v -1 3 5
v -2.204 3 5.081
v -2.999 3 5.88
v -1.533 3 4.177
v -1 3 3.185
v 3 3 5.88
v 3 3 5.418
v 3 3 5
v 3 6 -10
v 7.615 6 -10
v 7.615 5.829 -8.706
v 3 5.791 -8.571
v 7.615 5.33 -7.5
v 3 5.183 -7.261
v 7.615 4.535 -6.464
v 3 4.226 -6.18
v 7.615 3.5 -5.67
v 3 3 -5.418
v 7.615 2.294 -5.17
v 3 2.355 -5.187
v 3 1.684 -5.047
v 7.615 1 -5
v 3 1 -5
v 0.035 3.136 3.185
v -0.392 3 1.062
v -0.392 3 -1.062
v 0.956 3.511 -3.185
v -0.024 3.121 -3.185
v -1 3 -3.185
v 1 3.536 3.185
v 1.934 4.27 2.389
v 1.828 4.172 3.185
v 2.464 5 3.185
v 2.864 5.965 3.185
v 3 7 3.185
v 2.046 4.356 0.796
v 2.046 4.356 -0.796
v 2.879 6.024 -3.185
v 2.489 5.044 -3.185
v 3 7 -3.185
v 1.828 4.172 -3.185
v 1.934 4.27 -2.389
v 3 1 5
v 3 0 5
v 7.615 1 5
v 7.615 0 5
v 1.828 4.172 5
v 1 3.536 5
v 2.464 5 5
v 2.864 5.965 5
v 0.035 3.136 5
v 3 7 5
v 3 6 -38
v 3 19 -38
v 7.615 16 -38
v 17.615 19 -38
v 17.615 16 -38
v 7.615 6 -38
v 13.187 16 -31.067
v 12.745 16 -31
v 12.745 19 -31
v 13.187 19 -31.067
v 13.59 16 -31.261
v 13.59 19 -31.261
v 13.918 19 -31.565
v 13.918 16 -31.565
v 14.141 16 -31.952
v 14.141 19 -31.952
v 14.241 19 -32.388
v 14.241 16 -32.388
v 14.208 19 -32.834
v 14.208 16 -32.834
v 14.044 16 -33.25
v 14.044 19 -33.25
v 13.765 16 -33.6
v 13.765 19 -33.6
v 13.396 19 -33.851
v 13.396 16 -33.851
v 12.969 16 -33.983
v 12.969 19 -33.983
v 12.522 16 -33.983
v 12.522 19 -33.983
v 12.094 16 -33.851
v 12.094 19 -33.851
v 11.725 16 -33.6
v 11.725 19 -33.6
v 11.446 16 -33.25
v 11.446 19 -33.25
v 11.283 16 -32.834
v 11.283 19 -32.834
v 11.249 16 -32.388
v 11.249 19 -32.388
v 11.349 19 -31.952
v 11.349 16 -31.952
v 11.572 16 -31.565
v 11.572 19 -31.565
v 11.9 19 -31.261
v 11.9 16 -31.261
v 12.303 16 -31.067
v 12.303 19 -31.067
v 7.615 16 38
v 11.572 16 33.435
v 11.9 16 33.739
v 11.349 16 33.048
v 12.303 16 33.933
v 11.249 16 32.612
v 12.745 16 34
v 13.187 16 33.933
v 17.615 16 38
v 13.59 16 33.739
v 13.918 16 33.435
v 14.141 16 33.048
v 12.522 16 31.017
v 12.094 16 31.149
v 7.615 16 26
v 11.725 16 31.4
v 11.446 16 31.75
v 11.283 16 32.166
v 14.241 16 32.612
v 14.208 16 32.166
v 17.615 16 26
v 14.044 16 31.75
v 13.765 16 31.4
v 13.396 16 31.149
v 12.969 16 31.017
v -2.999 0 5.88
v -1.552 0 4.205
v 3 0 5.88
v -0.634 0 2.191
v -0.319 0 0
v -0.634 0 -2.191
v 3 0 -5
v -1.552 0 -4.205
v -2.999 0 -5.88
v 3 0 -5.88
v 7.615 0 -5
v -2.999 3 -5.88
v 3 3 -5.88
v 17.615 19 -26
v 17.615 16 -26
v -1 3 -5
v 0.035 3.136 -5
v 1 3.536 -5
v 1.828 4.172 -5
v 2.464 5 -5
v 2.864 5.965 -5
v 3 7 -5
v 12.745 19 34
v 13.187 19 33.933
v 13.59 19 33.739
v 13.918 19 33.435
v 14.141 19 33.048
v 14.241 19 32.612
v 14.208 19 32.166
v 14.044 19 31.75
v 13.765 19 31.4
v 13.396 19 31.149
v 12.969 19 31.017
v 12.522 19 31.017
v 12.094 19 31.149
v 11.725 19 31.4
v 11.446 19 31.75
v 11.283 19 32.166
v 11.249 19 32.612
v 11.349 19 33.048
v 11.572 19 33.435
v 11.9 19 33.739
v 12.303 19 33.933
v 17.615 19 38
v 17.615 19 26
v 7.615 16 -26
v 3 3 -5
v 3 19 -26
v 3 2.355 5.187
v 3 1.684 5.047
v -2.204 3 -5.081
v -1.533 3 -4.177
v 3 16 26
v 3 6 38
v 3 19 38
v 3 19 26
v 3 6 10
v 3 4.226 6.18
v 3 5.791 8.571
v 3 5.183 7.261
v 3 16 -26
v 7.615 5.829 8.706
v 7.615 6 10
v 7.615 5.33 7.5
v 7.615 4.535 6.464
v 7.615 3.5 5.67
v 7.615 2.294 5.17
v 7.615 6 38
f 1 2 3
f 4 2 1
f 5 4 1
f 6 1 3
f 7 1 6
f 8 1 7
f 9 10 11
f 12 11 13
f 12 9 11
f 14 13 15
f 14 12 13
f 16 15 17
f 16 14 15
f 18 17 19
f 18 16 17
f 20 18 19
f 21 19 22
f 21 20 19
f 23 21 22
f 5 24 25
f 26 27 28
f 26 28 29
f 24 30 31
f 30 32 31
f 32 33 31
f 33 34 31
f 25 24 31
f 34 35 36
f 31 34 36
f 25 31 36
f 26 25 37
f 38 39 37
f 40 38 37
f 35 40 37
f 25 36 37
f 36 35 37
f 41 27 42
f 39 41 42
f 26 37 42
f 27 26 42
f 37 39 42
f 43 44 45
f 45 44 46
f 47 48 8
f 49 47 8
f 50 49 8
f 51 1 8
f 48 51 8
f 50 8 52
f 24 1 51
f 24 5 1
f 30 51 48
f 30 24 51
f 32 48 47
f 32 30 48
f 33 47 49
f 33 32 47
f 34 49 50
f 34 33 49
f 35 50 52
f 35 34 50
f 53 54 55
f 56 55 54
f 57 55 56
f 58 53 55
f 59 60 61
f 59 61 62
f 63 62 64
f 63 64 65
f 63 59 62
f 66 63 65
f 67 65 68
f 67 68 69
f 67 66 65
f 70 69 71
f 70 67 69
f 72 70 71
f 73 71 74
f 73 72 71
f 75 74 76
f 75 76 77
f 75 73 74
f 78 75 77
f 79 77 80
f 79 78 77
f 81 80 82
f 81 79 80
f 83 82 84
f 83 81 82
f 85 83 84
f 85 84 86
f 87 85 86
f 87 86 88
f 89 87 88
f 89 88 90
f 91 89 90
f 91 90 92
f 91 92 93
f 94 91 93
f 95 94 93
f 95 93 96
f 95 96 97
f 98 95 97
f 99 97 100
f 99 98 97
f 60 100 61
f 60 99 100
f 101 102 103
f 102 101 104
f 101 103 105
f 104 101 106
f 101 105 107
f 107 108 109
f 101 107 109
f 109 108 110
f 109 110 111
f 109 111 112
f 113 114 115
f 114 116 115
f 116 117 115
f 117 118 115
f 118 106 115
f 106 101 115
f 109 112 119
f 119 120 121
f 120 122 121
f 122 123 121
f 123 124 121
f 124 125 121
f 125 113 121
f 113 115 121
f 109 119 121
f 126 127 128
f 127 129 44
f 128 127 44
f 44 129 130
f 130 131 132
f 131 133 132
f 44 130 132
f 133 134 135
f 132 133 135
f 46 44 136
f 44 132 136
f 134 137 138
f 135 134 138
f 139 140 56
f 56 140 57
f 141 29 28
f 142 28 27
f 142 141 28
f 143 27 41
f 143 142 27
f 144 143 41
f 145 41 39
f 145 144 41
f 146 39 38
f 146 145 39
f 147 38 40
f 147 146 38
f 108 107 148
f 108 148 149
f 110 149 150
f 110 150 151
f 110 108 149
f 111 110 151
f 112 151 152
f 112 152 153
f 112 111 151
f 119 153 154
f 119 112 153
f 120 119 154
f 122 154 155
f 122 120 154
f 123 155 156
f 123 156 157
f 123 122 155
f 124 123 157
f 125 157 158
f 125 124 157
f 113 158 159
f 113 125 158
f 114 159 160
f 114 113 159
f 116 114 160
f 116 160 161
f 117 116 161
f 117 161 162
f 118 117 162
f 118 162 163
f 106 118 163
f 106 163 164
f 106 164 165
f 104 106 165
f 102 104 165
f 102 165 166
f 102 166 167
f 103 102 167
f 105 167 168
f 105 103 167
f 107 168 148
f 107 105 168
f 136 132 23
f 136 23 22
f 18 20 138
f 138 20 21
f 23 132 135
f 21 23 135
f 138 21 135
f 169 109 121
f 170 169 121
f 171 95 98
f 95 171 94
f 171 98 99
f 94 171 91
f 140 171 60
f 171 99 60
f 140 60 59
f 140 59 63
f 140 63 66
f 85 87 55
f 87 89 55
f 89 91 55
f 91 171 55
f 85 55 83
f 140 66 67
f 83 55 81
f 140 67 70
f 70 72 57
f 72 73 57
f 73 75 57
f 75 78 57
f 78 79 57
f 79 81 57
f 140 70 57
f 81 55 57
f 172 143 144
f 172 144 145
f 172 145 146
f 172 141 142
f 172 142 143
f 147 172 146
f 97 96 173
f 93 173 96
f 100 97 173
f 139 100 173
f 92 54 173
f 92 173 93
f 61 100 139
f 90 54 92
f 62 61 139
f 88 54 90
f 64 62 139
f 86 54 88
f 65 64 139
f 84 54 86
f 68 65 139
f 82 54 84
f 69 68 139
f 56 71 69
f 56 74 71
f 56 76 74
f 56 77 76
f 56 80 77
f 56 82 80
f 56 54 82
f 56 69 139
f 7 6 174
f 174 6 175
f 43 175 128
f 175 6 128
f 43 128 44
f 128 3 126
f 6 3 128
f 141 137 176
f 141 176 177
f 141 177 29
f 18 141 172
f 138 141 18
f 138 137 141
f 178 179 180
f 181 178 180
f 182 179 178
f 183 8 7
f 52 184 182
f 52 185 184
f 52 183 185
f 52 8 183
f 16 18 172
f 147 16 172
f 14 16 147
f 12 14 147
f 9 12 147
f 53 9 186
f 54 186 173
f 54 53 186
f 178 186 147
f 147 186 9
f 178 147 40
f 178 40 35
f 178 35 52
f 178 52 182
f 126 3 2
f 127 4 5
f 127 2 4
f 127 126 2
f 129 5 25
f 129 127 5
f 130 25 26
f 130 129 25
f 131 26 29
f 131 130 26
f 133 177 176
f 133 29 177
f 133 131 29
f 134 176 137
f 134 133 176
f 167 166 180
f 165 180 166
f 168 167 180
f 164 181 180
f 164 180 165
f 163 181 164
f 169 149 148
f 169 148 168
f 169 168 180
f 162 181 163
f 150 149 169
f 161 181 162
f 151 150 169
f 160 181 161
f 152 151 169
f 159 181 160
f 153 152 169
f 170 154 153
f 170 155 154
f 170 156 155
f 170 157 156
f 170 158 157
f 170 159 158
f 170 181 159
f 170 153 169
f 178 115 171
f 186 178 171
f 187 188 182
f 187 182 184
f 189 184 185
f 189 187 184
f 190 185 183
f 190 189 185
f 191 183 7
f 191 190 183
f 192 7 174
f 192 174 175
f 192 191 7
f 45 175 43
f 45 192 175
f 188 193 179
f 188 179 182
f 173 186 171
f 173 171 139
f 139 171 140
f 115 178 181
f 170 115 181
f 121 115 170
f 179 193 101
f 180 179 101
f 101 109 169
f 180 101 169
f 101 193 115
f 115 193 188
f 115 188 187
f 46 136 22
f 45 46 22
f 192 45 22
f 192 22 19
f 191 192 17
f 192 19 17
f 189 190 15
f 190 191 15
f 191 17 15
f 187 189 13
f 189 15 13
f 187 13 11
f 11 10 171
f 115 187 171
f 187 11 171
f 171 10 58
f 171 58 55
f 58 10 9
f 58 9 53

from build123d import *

# Parameters (mm, degrees)
SKETCH1_R           = 1.5
BOSS_EXTRUDE1_DEPTH = 3
SKETCH3_W           = 4.615398666
SKETCH3_H           = 10
BOSS_EXTRUDE2_DEPTH = 12.9997796
FILLET7_R           = 1
CUT_EXTRUDE4_DEPTH  = 10
FILLET8_R           = 4
SKETCH8_W           = 76
SKETCH8_H           = 10
BOSS_EXTRUDE3_DEPTH = 4.615398666
SKETCH9_W           = 14.615398666
SKETCH9_H           = 12
SKETCH9_R           = 1.5
BOSS_EXTRUDE4_DEPTH = 3
FILLET9_R           = 5
FILLET10_R          = 5
SKETCH10_W          = 9.773230982
SKETCH10_H          = 9.985016007
SKETCH10_W_2        = 12.713773796
SKETCH10_H_2        = 7.76031956
CUT_EXTRUDE6_DEPTH  = 10


with BuildPart() as part:
    # Sketch1 → Boss-Extrude1 (new body)
    with BuildSketch(Plane(origin=(0, 0, 0), x_dir=(1, 0, 0), z_dir=(0, 1, 0))):
        Polygon((-3, -11.32792047), (3, -11.32792047), (3, -5), (7.615398666, -5), (7.615398666, 5), (3, 5), (3, 11.32792047), (-3, 11.32792047), align=None)
        with Locations(Location((0, 8.5, 0), (0, 0, 270))):
            Circle(SKETCH1_R, mode=Mode.SUBTRACT)
        with Locations(Location((0, -8.5, 0), (0, 0, 270))):
            Circle(SKETCH1_R, mode=Mode.SUBTRACT)
    extrude(amount=BOSS_EXTRUDE1_DEPTH)

    # Sketch3 → Boss-Extrude2 (add)
    with BuildSketch(Plane(origin=(0, 3, 0), x_dir=(1, 0, 0), z_dir=(0, 1, 0))):
        with Locations((5.307699333, 0)):
            Rectangle(SKETCH3_W, SKETCH3_H)
    extrude(amount=BOSS_EXTRUDE2_DEPTH)

    # Fillet7
    fillet7_edges = [part.edges().sort_by_distance(p)[0] for p in [
        (3, 1.5, 11.32792047),
        (3, 1.5, -11.32792047),
    ]]
    fillet(fillet7_edges, radius=FILLET7_R)

    # Sketch7 → Cut-Extrude4 (cut)
    with BuildSketch(Plane.XZ):
        with BuildLine():
            Line((-3.65526474, -6.392053518), (-3.78188192, 6.478485425))
            ThreePointArc((-3.78188192, 6.478485425), (-0.319780446, 0.076652438), (-3.65526474, -6.392053518))
        make_face()
    extrude(amount=-CUT_EXTRUDE4_DEPTH, mode=Mode.SUBTRACT)

    # Fillet8
    fillet8_edges = [part.edges().sort_by_distance(p)[0] for p in [
        (3, 3, 0),
    ]]
    fillet(fillet8_edges, radius=FILLET8_R)

    # Sketch8 → Boss-Extrude3 (add)
    with BuildSketch(Plane(origin=(7.615398666, 0, 0), x_dir=(0, 0, -1), z_dir=(1, 0, 0))):
        with Locations((0, 10.9997796)):
            Rectangle(SKETCH8_W, SKETCH8_H)
    extrude(amount=-BOSS_EXTRUDE3_DEPTH)

    # Sketch9 → Boss-Extrude4 (add)
    # profile 1 of 2: a face of its own
    with BuildSketch(Plane(origin=(0, 15.9997796, 0), x_dir=(1, 0, 0), z_dir=(0, 1, 0))):
        with Locations((10.307699333, 32)):
            Rectangle(SKETCH9_W, SKETCH9_H)
        with Locations(Location((12.745112207, 32.5, 0), (0, 0, 270))):
            Circle(SKETCH9_R, mode=Mode.SUBTRACT)
    # profile 2 of 2: a face of its own
    with BuildSketch(Plane(origin=(0, 15.9997796, 0), x_dir=(1, 0, 0), z_dir=(0, 1, 0))):
        with Locations((10.307699333, -32)):
            Rectangle(SKETCH9_W, SKETCH9_H)
        with Locations(Location((12.745112207, -32.5, 0), (0, 0, 270))):
            Circle(SKETCH9_R, mode=Mode.SUBTRACT)
    extrude(amount=BOSS_EXTRUDE4_DEPTH)

    # Fillet9
    # the kernel refuses this fillet: 5 mm, written as the material it adds along each edge
    with BuildSketch(Plane(origin=(7.615398666, 5.9997796, 5), x_dir=(0, -1, 0), z_dir=(-1, 0, 0))) as fillet9_piece_1:
        with BuildLine():
            CenterArc((FILLET9_R, FILLET9_R), FILLET9_R, 180, 90)
            Line((0, FILLET9_R), (0, 0))
            Line((0, 0), (FILLET9_R, 0))
        make_face()
    extrude(amount=4.615398666)

    # Fillet10
    # the kernel refuses this fillet: 5 mm, written as the material it adds along each edge
    with BuildSketch(Plane(origin=(3, 5.9997796, -5), x_dir=(0, -1, 0), z_dir=(1, 0, 0))) as fillet10_piece_1:
        with BuildLine():
            CenterArc((FILLET10_R, FILLET10_R), FILLET10_R, 180, 90)
            Line((0, FILLET10_R), (0, 0))
            Line((0, 0), (FILLET10_R, 0))
        make_face()
    extrude(amount=4.615398666)

    # Sketch10 → Cut-Extrude6 (cut)
    with BuildSketch(Plane(origin=(0, 3, 0), x_dir=(1, 0, 0), z_dir=(0, 1, 0))):
        with Locations((-1.330252474, 10.872508004)):
            Rectangle(SKETCH10_W, SKETCH10_H)
        with Locations((-2.800523881, -9.76015978)):
            Rectangle(SKETCH10_W_2, SKETCH10_H_2)
    extrude(amount=-CUT_EXTRUDE6_DEPTH, mode=Mode.SUBTRACT)


solid = part.part
